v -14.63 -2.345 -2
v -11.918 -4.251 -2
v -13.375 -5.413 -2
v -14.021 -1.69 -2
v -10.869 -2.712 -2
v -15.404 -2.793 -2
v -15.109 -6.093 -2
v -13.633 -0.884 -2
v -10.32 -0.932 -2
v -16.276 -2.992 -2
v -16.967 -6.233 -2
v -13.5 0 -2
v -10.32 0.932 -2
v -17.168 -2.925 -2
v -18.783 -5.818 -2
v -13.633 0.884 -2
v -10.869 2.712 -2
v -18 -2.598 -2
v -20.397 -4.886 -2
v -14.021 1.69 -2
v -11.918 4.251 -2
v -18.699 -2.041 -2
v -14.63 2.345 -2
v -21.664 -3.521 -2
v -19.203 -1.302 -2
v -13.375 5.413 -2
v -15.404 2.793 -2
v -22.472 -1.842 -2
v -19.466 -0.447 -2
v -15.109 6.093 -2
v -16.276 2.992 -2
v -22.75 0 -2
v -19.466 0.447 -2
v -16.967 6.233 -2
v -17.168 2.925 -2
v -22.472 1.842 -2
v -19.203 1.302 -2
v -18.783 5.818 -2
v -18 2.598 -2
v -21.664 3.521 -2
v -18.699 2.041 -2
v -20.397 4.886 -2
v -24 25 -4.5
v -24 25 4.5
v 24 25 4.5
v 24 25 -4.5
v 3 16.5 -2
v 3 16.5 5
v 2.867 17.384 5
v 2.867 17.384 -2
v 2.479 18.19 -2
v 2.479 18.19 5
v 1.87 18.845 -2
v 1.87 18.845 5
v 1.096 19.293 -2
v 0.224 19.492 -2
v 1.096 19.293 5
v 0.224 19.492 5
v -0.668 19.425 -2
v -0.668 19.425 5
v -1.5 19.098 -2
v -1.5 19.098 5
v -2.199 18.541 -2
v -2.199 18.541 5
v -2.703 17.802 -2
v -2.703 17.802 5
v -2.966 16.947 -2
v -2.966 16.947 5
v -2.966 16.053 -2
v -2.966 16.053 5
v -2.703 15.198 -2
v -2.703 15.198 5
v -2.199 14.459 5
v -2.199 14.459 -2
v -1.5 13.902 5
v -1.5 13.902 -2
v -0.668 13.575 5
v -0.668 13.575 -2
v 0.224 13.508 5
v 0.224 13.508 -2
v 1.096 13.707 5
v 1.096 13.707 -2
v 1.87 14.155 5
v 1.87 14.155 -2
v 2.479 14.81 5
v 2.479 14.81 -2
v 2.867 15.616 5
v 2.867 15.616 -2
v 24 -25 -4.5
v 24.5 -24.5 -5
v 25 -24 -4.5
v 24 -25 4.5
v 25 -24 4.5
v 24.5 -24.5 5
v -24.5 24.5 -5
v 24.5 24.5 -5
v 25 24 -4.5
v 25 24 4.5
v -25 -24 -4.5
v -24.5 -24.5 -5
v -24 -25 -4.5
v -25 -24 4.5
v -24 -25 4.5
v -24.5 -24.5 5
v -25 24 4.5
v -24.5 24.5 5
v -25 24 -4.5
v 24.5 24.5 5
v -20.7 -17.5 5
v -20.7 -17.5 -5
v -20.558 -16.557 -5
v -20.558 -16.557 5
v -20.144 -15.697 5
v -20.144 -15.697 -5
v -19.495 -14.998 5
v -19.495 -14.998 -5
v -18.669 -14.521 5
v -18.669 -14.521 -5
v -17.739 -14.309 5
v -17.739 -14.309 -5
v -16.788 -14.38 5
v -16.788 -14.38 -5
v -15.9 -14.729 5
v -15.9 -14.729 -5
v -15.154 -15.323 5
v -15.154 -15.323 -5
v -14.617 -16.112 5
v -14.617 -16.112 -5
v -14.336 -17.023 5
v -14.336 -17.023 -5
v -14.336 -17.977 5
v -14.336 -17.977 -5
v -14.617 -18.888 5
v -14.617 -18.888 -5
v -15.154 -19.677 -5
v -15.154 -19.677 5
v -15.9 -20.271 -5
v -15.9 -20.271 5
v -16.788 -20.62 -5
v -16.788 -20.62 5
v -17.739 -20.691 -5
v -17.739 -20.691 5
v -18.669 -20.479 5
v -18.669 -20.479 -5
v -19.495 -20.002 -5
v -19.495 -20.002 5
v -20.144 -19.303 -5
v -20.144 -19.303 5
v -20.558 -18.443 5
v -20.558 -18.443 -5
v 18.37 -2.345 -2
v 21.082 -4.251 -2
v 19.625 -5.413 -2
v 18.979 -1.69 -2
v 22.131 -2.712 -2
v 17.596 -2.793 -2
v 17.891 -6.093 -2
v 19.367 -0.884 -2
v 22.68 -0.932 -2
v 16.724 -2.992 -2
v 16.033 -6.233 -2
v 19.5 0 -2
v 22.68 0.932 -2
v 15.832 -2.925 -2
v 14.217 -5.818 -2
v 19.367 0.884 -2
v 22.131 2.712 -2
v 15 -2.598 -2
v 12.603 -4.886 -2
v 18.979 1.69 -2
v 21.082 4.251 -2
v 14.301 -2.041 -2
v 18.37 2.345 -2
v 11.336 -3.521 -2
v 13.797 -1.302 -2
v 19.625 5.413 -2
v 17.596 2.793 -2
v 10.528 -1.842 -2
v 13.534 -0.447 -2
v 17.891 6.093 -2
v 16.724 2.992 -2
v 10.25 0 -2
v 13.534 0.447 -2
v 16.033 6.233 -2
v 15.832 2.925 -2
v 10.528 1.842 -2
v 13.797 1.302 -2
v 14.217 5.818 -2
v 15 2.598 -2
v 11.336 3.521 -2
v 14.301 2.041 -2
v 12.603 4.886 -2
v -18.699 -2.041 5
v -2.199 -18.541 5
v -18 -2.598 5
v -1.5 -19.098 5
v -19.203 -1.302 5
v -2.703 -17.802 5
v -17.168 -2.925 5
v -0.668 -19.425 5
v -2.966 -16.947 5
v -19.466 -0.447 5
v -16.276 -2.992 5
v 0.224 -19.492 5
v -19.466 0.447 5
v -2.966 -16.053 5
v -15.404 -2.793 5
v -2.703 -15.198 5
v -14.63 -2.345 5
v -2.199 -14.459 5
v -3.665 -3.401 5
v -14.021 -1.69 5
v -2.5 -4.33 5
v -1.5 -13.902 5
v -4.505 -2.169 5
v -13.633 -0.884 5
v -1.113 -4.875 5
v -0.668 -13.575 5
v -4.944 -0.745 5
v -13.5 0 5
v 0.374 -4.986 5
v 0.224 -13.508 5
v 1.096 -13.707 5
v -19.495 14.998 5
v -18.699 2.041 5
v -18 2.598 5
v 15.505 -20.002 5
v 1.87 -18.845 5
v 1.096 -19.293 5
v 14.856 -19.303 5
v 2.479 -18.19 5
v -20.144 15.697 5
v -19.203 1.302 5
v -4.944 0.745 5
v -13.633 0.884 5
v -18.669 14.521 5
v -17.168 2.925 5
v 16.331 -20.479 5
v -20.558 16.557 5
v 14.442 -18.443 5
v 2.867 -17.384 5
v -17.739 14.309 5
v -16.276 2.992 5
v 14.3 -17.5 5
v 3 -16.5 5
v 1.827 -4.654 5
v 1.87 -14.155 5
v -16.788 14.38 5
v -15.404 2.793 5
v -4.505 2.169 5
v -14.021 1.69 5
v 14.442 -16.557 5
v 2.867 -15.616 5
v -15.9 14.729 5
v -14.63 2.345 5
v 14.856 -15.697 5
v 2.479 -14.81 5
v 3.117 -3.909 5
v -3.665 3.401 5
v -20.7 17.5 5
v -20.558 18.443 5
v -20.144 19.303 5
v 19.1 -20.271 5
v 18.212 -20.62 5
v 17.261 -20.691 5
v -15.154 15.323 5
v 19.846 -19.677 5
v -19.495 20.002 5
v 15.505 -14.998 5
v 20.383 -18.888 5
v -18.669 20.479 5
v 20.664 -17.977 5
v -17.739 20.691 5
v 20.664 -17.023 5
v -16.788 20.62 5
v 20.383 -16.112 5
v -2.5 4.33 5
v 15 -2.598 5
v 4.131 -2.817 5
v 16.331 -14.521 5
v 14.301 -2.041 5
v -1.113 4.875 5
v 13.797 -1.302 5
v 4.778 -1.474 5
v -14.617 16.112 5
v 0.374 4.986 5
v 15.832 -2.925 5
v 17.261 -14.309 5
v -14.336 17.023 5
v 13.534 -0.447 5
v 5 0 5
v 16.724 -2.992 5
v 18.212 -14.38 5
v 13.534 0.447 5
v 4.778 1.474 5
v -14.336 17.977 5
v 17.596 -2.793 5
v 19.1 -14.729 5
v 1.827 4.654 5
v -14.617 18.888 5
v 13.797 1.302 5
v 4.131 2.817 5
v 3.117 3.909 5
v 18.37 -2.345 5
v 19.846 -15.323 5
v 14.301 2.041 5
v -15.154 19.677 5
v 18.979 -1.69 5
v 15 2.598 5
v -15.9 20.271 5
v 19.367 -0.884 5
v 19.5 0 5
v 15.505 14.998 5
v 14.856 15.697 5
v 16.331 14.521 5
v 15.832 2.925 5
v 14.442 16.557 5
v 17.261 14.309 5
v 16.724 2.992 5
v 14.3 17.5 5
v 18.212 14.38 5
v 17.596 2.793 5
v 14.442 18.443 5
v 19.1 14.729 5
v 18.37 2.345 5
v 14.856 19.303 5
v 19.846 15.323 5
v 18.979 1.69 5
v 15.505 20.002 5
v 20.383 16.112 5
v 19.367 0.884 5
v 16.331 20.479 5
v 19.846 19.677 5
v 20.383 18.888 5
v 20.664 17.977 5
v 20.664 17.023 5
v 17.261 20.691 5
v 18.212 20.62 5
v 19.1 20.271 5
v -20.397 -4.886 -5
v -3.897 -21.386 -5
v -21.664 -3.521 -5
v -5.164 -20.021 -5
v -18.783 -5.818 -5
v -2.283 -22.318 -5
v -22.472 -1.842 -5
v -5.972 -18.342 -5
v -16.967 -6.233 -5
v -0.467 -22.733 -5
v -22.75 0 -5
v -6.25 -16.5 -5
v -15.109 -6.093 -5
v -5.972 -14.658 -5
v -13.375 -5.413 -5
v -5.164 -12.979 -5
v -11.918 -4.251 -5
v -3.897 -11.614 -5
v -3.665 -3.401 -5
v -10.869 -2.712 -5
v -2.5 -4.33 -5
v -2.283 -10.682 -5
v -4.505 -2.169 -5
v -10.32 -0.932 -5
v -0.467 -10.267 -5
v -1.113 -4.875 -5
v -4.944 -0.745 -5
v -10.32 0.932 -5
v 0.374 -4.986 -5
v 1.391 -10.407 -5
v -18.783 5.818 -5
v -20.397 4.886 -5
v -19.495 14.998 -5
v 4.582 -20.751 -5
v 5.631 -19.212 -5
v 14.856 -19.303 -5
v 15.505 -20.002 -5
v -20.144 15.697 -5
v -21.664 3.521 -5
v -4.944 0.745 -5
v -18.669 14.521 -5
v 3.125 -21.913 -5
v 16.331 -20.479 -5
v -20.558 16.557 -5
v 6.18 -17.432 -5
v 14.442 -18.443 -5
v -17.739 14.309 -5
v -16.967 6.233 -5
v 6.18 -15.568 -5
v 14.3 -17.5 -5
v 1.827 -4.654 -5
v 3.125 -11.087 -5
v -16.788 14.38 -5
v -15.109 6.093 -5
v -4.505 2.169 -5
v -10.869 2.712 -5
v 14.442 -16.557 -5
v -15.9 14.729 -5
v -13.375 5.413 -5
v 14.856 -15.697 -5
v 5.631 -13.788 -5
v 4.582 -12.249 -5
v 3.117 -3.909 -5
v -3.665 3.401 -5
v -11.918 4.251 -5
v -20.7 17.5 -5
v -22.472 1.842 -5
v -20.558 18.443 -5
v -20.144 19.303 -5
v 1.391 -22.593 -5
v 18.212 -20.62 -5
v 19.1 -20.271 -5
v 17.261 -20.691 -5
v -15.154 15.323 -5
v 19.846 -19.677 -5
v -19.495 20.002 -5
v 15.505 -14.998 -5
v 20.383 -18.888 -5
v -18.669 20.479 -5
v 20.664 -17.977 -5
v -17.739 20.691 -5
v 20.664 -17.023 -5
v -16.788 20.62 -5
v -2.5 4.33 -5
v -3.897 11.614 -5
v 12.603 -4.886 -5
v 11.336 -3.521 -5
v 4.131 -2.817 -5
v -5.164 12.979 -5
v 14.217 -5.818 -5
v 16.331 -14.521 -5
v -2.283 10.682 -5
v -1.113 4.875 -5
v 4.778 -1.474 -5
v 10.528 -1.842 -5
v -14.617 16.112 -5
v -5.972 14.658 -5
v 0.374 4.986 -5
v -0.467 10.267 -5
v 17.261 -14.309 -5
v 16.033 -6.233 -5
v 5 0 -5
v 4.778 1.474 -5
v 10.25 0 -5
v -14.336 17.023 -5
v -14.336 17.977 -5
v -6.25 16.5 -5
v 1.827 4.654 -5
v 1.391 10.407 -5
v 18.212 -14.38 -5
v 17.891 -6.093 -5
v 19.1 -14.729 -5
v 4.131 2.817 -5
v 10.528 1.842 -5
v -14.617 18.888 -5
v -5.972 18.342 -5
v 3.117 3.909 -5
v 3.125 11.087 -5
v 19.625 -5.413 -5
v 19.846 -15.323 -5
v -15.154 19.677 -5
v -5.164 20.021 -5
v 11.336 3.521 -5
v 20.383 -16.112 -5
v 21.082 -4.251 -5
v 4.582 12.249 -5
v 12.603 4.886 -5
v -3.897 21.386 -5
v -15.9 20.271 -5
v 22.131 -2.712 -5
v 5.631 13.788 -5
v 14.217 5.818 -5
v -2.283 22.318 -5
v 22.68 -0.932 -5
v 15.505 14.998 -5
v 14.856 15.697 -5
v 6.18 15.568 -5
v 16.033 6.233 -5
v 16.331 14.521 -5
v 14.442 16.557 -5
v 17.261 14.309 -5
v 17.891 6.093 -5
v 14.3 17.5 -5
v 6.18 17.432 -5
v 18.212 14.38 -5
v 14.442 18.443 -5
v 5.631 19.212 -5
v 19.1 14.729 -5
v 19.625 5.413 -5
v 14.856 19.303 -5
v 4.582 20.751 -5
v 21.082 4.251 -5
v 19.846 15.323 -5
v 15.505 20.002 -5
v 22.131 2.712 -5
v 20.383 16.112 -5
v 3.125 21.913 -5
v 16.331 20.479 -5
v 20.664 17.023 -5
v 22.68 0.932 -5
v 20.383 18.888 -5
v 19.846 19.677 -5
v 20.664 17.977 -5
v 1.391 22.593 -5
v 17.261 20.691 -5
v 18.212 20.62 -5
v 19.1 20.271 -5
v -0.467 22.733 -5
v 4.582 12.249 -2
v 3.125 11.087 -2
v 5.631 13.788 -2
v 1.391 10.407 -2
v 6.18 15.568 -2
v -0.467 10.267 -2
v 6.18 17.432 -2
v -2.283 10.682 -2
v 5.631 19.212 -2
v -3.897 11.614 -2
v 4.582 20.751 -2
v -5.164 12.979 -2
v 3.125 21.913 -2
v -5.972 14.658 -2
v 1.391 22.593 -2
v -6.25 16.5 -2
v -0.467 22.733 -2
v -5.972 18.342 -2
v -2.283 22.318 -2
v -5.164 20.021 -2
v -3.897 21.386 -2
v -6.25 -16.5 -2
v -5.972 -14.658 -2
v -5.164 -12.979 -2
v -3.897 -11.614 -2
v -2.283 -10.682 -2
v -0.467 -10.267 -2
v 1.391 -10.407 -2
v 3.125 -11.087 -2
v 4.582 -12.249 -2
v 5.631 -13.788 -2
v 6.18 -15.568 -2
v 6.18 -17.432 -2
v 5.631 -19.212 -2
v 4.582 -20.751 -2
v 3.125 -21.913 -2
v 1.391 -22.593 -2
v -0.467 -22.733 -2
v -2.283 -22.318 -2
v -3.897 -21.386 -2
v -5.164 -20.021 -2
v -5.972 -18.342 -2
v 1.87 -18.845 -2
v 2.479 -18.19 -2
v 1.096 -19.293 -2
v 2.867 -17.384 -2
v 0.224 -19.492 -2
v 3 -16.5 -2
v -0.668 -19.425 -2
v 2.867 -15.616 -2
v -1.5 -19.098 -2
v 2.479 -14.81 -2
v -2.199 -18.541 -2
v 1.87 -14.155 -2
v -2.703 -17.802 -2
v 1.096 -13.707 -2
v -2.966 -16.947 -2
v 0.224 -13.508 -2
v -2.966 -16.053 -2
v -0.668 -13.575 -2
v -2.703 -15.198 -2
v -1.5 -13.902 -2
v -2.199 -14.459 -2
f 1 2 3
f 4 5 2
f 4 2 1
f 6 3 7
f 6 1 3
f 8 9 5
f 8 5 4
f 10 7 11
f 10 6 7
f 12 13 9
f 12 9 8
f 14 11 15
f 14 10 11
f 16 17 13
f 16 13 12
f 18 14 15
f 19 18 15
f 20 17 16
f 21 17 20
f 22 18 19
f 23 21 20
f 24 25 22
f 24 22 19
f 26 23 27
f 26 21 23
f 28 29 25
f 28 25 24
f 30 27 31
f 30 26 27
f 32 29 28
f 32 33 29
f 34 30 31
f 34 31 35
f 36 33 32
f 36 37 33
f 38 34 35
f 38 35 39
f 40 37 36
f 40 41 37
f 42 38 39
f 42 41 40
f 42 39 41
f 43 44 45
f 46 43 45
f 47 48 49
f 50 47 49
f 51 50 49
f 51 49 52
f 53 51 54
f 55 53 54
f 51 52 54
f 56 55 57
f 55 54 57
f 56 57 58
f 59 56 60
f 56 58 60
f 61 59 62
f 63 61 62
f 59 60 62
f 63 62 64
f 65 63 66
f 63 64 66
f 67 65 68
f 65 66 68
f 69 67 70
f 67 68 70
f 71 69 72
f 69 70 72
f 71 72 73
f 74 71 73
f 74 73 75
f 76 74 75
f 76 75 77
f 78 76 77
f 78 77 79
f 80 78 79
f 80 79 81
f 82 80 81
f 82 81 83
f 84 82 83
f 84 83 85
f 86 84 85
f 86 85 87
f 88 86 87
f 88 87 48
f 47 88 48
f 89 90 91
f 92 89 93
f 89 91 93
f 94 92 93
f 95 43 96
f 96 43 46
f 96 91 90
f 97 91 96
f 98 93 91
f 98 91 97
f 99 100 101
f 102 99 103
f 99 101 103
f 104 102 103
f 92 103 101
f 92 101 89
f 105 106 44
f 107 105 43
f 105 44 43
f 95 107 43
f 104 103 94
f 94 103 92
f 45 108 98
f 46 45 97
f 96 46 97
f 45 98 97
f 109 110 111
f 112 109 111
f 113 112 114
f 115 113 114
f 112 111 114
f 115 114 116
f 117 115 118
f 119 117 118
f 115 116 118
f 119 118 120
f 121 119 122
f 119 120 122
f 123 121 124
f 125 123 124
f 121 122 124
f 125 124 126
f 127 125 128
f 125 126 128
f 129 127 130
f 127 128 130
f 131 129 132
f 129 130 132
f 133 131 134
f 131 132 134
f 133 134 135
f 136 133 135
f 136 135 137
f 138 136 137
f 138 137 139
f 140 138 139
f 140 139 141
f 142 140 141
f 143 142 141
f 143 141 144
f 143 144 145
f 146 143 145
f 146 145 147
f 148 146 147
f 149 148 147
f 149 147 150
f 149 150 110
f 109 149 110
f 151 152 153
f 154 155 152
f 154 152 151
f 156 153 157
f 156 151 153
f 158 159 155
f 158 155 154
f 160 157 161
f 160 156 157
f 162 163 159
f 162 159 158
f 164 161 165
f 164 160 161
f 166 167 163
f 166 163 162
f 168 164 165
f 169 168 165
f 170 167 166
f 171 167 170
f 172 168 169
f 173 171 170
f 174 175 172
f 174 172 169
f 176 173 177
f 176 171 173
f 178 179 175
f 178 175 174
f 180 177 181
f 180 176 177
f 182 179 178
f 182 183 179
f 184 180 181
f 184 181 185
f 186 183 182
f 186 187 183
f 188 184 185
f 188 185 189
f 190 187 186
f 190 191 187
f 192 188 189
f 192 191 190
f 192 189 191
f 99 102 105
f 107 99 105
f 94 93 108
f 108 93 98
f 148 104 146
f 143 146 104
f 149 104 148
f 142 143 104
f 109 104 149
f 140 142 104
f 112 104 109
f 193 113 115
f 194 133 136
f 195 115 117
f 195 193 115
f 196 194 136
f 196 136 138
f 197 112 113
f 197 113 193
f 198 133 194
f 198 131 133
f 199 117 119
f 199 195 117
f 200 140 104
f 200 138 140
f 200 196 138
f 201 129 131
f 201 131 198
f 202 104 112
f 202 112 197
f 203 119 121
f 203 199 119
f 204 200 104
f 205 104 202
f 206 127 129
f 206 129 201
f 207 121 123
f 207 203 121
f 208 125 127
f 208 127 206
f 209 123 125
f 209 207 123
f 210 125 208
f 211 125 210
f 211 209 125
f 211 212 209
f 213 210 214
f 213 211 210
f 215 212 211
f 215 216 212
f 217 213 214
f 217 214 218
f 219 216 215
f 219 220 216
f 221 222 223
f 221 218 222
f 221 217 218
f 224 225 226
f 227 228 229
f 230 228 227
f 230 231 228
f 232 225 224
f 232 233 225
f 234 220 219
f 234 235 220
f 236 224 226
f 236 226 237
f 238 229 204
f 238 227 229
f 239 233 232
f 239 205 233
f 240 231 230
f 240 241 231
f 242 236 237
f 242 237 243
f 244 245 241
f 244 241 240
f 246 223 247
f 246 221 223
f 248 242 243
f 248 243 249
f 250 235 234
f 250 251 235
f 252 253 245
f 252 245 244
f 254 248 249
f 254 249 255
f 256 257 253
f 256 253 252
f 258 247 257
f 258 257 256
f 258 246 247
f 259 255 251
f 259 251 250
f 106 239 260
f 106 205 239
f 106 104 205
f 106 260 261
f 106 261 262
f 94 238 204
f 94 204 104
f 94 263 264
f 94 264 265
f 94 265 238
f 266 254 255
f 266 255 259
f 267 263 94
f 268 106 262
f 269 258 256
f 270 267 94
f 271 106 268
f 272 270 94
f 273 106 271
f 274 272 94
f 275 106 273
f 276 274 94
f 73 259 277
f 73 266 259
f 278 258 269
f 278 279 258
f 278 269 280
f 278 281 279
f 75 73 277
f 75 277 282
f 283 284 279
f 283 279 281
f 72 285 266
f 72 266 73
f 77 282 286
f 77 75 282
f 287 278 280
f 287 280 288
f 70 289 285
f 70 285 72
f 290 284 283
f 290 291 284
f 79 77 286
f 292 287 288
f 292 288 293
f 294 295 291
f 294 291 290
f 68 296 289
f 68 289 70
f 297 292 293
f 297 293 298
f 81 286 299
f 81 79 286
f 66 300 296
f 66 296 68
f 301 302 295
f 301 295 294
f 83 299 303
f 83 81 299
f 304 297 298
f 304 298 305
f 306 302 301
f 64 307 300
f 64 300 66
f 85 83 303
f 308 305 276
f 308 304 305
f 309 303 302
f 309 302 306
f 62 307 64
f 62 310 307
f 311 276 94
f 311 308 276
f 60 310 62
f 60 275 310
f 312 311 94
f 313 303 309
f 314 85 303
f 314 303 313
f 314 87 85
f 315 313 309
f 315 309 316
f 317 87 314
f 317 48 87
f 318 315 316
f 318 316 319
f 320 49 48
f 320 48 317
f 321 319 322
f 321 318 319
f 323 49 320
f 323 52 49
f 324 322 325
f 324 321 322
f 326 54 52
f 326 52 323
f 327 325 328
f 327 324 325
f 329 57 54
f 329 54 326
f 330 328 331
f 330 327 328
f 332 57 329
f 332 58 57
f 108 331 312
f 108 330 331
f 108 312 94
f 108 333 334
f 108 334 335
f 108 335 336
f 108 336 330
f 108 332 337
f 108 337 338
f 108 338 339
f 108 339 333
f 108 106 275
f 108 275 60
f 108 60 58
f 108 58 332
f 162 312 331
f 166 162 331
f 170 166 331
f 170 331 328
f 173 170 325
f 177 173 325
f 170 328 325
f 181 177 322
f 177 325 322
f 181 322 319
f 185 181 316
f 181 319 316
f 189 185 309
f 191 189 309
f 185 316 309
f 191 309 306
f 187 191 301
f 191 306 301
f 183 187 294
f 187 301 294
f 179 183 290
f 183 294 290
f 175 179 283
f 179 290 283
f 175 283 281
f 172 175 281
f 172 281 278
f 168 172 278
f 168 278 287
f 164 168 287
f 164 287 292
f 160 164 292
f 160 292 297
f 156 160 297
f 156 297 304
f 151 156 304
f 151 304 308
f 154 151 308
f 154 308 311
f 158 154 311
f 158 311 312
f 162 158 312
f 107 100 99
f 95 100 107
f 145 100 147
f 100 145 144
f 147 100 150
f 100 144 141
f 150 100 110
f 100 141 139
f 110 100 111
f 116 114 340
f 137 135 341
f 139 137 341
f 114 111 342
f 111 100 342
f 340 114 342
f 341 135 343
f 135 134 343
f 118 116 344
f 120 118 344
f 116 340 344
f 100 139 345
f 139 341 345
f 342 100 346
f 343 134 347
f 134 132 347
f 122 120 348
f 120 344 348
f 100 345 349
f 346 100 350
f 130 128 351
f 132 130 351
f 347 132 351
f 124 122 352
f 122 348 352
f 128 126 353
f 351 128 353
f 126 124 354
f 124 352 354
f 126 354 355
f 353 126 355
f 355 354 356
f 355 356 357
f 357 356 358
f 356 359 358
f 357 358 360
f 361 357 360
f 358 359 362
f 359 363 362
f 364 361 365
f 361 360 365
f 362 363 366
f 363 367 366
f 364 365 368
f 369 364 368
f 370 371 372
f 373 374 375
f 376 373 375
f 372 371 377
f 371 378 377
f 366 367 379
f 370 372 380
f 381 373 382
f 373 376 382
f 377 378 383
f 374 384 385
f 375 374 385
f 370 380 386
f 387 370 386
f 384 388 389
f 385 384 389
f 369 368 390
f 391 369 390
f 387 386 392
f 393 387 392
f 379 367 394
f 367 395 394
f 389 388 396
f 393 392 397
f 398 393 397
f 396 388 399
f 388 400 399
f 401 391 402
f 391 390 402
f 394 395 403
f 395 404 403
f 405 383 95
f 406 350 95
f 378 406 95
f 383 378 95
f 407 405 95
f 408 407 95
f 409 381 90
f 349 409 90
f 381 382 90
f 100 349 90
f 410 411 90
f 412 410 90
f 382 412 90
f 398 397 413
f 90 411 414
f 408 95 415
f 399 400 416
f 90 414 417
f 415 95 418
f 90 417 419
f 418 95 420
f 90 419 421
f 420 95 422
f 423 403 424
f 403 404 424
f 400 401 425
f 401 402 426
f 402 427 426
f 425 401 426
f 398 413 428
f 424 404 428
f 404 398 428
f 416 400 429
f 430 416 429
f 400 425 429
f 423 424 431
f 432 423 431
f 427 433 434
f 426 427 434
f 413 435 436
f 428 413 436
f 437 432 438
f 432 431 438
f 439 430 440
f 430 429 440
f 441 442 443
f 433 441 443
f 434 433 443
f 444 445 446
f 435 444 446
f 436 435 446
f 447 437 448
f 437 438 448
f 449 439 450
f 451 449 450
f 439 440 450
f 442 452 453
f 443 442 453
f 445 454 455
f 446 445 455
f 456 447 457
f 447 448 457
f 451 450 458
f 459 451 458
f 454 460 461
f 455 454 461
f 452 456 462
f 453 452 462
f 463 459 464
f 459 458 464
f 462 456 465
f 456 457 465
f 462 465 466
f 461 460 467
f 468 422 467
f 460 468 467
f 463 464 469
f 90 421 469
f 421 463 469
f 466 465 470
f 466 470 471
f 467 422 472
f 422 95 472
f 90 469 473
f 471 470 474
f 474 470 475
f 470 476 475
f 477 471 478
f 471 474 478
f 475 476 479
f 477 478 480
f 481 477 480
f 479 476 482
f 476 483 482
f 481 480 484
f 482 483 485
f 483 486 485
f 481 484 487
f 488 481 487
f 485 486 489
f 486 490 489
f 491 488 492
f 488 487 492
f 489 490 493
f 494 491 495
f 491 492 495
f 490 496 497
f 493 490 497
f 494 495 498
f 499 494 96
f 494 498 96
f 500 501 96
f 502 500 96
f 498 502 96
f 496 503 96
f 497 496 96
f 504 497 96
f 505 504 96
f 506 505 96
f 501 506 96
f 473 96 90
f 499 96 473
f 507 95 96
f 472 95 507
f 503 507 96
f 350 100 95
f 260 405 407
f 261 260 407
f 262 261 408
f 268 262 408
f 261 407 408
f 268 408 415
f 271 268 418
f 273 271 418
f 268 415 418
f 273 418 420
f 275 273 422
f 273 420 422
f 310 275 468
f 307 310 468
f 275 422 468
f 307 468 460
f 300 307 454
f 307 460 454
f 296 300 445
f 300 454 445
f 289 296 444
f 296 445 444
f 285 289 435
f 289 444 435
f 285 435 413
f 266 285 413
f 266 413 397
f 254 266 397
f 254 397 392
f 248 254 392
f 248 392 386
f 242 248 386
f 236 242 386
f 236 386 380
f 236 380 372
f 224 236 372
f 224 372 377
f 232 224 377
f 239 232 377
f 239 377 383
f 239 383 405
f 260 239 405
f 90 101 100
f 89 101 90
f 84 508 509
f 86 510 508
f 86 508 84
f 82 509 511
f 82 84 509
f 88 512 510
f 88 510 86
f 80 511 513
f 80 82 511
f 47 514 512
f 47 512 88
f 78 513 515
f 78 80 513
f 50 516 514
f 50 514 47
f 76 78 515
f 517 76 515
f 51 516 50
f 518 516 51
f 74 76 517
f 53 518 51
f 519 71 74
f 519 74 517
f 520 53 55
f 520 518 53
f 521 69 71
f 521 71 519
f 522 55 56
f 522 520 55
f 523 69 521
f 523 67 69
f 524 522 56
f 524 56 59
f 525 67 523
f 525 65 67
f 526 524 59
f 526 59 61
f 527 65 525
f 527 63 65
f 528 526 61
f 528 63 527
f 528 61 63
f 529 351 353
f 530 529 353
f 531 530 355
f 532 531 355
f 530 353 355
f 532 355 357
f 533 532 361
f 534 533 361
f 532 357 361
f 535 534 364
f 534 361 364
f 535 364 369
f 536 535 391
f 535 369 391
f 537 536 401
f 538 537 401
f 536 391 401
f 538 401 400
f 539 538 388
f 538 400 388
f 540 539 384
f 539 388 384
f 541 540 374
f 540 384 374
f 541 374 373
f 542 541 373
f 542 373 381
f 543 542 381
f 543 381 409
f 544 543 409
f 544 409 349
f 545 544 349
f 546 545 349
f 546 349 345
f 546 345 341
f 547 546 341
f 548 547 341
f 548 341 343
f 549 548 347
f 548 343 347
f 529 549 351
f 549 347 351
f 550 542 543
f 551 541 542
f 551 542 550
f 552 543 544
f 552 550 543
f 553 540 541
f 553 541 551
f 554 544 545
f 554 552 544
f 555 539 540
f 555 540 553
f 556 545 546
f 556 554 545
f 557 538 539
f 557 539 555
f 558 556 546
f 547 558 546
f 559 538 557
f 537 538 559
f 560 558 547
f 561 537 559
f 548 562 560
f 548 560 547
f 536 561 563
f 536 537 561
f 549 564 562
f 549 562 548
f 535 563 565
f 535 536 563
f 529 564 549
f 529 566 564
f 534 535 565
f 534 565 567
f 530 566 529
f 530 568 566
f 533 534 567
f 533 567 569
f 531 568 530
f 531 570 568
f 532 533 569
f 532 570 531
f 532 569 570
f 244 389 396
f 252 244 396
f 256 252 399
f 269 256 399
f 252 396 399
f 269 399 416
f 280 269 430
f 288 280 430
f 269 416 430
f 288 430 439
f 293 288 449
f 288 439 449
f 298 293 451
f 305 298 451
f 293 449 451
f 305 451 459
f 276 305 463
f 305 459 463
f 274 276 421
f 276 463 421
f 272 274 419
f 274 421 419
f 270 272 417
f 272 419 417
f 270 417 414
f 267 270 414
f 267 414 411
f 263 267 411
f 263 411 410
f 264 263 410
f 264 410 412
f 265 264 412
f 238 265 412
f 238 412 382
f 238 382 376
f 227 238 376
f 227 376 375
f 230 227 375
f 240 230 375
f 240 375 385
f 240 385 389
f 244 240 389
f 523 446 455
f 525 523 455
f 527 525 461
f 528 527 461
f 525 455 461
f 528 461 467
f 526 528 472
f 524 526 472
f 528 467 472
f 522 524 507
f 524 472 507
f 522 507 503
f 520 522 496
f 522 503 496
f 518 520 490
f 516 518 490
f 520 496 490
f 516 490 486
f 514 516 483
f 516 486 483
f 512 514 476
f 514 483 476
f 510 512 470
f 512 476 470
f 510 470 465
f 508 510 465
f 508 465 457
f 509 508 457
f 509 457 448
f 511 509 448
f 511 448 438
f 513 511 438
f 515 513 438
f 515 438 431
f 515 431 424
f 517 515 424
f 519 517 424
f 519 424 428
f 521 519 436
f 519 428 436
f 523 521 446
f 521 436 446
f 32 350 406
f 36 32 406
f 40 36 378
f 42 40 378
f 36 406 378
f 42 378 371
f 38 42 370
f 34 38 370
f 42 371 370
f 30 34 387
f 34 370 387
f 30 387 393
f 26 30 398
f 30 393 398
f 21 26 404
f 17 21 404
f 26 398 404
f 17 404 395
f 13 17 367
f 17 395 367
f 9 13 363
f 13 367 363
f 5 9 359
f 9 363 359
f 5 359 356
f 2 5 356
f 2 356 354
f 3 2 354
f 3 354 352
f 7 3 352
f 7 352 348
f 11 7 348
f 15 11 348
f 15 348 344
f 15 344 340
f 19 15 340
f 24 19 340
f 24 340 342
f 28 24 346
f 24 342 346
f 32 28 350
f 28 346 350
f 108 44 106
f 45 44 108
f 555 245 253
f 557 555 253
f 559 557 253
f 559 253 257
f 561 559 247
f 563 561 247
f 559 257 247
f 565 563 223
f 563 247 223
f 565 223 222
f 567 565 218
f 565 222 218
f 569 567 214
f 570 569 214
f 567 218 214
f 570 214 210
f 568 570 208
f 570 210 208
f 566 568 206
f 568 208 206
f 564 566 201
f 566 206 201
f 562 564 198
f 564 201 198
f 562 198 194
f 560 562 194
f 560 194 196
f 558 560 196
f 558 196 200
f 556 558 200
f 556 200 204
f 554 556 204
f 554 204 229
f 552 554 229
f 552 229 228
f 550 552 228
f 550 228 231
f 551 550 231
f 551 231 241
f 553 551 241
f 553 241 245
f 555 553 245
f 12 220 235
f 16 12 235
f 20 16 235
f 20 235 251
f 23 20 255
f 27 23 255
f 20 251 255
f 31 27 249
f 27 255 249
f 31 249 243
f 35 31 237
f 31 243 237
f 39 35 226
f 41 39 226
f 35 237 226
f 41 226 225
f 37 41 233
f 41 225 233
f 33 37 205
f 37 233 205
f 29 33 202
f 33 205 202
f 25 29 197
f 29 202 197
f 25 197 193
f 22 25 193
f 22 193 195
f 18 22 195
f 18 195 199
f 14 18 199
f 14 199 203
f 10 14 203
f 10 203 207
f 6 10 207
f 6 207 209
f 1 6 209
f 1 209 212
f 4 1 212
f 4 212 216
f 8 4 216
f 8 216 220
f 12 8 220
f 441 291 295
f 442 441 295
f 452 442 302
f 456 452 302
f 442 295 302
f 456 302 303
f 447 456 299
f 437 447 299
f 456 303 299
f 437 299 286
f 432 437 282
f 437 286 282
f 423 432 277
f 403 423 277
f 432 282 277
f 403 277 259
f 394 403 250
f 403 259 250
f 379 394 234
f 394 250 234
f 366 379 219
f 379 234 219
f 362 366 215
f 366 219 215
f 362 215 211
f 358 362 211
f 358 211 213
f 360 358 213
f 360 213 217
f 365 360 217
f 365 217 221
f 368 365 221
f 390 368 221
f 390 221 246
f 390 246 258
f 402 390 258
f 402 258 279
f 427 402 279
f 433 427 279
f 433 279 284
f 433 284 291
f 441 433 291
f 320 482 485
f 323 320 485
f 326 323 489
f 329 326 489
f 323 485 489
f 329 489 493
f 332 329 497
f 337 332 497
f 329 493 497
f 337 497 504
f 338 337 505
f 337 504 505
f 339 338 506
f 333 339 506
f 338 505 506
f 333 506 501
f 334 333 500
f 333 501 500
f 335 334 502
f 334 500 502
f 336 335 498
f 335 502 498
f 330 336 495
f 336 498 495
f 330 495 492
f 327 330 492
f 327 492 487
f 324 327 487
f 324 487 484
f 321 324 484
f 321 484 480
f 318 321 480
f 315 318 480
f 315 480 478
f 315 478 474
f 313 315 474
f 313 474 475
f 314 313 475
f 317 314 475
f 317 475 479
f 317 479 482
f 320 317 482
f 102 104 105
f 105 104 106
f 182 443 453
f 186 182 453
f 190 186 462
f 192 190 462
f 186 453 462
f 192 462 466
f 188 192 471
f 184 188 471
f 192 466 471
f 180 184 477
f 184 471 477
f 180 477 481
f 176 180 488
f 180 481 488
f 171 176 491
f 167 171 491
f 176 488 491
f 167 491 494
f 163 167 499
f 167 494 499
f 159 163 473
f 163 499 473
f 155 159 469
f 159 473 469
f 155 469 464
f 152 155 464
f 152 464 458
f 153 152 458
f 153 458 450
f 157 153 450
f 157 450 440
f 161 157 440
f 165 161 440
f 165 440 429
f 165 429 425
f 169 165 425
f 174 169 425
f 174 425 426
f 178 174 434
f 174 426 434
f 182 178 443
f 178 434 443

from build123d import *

# Parameters (mm, degrees)
SKETCH1_W                = 50
SKETCH1_H                = 50
BOSS_EXTRUDE1_DEPTH      = 5
M6_CLEARANCE_HOLE1_D     = 6.4
CUT_EXTRUDE1_REACH       = 38.742
SKETCH5_R                = 5
CHAMFER1_SIZE            = 1
CHAMFER2_SIZE            = 0.5
F_6_0_6_DIAMETER_HOLE1_D = 6
SKETCH12_R               = 6.25
CUT_EXTRUDE2_DEPTH       = 3


with BuildPart() as part:
    # Sketch1 → Boss-Extrude1 (new, symmetric)
    with BuildSketch(Plane.XY):
        Rectangle(SKETCH1_W, SKETCH1_H)
    extrude(amount=BOSS_EXTRUDE1_DEPTH, both=True)

    # M6 Clearance Hole1 (through all)
    with Locations(Plane.XY.offset(5)):
        with Locations((-17.5, 17.5), (17.5, 17.5), (17.5, -17.5), (-17.5, -17.5)):
            Hole(M6_CLEARANCE_HOLE1_D / 2)

    # Sketch5 → Cut-Extrude1 (cut, up to next)
    with BuildSketch(Plane.XY.offset(5), mode=Mode.PRIVATE) as cut_extrude1_sk1:
        Circle(SKETCH5_R)
    cut_extrude1_tool1 = extrude(cut_extrude1_sk1.sketch, amount=-CUT_EXTRUDE1_REACH, mode=Mode.PRIVATE) & part.part
    add(cut_extrude1_tool1.solids().sort_by_distance((0, 0, 5))[0], mode=Mode.SUBTRACT)

    # Chamfer1
    chamfer1_edges = [part.edges().sort_by_distance(p)[0] for p in [
        (25, -25, 0),
        (-25, -25, 0),
        (-25, 25, 0),
        (25, 25, 0),
    ]]
    chamfer(chamfer1_edges, length=CHAMFER1_SIZE)

    # Chamfer2
    chamfer2_edges = [part.edges().sort_by_distance(p)[0] for p in [
        (0, -25, 5),
        (0, -25, -5),
        (0, 25, -5),
        (0, 25, 5),
        (25, 0, -5),
        (25, 0, 5),
        (-25, 0, -5),
        (-25, 0, 5),
    ]]
    chamfer(chamfer2_edges, length=CHAMFER2_SIZE - 0.0001)  # a hair under: the kernel refuses the full size

    # Ø6.0 (6) Diameter Hole1 (through all)
    with Locations(Plane(origin=(0, 0, -5), x_dir=(-1, 0, 0), z_dir=(0, 0, -1))):
        with Locations((-16.5, 0), (0, 16.5), (16.5, 0), (0, -16.5)):
            Hole(F_6_0_6_DIAMETER_HOLE1_D / 2)

    # Sketch12 → Cut-Extrude2 (cut)
    with BuildSketch(Plane(origin=(0, 0, -5), x_dir=(-1, 0, 0), z_dir=(0, 0, -1))):
        with Locations((16.5, 0)):
            Circle(SKETCH12_R)
        with Locations((0, -16.5)):
            Circle(SKETCH12_R)
        with Locations((-16.5, 0)):
            Circle(SKETCH12_R)
        with Locations((0, 16.5)):
            Circle(SKETCH12_R)
    extrude(amount=-CUT_EXTRUDE2_DEPTH, mode=Mode.SUBTRACT)


solid = part.part
